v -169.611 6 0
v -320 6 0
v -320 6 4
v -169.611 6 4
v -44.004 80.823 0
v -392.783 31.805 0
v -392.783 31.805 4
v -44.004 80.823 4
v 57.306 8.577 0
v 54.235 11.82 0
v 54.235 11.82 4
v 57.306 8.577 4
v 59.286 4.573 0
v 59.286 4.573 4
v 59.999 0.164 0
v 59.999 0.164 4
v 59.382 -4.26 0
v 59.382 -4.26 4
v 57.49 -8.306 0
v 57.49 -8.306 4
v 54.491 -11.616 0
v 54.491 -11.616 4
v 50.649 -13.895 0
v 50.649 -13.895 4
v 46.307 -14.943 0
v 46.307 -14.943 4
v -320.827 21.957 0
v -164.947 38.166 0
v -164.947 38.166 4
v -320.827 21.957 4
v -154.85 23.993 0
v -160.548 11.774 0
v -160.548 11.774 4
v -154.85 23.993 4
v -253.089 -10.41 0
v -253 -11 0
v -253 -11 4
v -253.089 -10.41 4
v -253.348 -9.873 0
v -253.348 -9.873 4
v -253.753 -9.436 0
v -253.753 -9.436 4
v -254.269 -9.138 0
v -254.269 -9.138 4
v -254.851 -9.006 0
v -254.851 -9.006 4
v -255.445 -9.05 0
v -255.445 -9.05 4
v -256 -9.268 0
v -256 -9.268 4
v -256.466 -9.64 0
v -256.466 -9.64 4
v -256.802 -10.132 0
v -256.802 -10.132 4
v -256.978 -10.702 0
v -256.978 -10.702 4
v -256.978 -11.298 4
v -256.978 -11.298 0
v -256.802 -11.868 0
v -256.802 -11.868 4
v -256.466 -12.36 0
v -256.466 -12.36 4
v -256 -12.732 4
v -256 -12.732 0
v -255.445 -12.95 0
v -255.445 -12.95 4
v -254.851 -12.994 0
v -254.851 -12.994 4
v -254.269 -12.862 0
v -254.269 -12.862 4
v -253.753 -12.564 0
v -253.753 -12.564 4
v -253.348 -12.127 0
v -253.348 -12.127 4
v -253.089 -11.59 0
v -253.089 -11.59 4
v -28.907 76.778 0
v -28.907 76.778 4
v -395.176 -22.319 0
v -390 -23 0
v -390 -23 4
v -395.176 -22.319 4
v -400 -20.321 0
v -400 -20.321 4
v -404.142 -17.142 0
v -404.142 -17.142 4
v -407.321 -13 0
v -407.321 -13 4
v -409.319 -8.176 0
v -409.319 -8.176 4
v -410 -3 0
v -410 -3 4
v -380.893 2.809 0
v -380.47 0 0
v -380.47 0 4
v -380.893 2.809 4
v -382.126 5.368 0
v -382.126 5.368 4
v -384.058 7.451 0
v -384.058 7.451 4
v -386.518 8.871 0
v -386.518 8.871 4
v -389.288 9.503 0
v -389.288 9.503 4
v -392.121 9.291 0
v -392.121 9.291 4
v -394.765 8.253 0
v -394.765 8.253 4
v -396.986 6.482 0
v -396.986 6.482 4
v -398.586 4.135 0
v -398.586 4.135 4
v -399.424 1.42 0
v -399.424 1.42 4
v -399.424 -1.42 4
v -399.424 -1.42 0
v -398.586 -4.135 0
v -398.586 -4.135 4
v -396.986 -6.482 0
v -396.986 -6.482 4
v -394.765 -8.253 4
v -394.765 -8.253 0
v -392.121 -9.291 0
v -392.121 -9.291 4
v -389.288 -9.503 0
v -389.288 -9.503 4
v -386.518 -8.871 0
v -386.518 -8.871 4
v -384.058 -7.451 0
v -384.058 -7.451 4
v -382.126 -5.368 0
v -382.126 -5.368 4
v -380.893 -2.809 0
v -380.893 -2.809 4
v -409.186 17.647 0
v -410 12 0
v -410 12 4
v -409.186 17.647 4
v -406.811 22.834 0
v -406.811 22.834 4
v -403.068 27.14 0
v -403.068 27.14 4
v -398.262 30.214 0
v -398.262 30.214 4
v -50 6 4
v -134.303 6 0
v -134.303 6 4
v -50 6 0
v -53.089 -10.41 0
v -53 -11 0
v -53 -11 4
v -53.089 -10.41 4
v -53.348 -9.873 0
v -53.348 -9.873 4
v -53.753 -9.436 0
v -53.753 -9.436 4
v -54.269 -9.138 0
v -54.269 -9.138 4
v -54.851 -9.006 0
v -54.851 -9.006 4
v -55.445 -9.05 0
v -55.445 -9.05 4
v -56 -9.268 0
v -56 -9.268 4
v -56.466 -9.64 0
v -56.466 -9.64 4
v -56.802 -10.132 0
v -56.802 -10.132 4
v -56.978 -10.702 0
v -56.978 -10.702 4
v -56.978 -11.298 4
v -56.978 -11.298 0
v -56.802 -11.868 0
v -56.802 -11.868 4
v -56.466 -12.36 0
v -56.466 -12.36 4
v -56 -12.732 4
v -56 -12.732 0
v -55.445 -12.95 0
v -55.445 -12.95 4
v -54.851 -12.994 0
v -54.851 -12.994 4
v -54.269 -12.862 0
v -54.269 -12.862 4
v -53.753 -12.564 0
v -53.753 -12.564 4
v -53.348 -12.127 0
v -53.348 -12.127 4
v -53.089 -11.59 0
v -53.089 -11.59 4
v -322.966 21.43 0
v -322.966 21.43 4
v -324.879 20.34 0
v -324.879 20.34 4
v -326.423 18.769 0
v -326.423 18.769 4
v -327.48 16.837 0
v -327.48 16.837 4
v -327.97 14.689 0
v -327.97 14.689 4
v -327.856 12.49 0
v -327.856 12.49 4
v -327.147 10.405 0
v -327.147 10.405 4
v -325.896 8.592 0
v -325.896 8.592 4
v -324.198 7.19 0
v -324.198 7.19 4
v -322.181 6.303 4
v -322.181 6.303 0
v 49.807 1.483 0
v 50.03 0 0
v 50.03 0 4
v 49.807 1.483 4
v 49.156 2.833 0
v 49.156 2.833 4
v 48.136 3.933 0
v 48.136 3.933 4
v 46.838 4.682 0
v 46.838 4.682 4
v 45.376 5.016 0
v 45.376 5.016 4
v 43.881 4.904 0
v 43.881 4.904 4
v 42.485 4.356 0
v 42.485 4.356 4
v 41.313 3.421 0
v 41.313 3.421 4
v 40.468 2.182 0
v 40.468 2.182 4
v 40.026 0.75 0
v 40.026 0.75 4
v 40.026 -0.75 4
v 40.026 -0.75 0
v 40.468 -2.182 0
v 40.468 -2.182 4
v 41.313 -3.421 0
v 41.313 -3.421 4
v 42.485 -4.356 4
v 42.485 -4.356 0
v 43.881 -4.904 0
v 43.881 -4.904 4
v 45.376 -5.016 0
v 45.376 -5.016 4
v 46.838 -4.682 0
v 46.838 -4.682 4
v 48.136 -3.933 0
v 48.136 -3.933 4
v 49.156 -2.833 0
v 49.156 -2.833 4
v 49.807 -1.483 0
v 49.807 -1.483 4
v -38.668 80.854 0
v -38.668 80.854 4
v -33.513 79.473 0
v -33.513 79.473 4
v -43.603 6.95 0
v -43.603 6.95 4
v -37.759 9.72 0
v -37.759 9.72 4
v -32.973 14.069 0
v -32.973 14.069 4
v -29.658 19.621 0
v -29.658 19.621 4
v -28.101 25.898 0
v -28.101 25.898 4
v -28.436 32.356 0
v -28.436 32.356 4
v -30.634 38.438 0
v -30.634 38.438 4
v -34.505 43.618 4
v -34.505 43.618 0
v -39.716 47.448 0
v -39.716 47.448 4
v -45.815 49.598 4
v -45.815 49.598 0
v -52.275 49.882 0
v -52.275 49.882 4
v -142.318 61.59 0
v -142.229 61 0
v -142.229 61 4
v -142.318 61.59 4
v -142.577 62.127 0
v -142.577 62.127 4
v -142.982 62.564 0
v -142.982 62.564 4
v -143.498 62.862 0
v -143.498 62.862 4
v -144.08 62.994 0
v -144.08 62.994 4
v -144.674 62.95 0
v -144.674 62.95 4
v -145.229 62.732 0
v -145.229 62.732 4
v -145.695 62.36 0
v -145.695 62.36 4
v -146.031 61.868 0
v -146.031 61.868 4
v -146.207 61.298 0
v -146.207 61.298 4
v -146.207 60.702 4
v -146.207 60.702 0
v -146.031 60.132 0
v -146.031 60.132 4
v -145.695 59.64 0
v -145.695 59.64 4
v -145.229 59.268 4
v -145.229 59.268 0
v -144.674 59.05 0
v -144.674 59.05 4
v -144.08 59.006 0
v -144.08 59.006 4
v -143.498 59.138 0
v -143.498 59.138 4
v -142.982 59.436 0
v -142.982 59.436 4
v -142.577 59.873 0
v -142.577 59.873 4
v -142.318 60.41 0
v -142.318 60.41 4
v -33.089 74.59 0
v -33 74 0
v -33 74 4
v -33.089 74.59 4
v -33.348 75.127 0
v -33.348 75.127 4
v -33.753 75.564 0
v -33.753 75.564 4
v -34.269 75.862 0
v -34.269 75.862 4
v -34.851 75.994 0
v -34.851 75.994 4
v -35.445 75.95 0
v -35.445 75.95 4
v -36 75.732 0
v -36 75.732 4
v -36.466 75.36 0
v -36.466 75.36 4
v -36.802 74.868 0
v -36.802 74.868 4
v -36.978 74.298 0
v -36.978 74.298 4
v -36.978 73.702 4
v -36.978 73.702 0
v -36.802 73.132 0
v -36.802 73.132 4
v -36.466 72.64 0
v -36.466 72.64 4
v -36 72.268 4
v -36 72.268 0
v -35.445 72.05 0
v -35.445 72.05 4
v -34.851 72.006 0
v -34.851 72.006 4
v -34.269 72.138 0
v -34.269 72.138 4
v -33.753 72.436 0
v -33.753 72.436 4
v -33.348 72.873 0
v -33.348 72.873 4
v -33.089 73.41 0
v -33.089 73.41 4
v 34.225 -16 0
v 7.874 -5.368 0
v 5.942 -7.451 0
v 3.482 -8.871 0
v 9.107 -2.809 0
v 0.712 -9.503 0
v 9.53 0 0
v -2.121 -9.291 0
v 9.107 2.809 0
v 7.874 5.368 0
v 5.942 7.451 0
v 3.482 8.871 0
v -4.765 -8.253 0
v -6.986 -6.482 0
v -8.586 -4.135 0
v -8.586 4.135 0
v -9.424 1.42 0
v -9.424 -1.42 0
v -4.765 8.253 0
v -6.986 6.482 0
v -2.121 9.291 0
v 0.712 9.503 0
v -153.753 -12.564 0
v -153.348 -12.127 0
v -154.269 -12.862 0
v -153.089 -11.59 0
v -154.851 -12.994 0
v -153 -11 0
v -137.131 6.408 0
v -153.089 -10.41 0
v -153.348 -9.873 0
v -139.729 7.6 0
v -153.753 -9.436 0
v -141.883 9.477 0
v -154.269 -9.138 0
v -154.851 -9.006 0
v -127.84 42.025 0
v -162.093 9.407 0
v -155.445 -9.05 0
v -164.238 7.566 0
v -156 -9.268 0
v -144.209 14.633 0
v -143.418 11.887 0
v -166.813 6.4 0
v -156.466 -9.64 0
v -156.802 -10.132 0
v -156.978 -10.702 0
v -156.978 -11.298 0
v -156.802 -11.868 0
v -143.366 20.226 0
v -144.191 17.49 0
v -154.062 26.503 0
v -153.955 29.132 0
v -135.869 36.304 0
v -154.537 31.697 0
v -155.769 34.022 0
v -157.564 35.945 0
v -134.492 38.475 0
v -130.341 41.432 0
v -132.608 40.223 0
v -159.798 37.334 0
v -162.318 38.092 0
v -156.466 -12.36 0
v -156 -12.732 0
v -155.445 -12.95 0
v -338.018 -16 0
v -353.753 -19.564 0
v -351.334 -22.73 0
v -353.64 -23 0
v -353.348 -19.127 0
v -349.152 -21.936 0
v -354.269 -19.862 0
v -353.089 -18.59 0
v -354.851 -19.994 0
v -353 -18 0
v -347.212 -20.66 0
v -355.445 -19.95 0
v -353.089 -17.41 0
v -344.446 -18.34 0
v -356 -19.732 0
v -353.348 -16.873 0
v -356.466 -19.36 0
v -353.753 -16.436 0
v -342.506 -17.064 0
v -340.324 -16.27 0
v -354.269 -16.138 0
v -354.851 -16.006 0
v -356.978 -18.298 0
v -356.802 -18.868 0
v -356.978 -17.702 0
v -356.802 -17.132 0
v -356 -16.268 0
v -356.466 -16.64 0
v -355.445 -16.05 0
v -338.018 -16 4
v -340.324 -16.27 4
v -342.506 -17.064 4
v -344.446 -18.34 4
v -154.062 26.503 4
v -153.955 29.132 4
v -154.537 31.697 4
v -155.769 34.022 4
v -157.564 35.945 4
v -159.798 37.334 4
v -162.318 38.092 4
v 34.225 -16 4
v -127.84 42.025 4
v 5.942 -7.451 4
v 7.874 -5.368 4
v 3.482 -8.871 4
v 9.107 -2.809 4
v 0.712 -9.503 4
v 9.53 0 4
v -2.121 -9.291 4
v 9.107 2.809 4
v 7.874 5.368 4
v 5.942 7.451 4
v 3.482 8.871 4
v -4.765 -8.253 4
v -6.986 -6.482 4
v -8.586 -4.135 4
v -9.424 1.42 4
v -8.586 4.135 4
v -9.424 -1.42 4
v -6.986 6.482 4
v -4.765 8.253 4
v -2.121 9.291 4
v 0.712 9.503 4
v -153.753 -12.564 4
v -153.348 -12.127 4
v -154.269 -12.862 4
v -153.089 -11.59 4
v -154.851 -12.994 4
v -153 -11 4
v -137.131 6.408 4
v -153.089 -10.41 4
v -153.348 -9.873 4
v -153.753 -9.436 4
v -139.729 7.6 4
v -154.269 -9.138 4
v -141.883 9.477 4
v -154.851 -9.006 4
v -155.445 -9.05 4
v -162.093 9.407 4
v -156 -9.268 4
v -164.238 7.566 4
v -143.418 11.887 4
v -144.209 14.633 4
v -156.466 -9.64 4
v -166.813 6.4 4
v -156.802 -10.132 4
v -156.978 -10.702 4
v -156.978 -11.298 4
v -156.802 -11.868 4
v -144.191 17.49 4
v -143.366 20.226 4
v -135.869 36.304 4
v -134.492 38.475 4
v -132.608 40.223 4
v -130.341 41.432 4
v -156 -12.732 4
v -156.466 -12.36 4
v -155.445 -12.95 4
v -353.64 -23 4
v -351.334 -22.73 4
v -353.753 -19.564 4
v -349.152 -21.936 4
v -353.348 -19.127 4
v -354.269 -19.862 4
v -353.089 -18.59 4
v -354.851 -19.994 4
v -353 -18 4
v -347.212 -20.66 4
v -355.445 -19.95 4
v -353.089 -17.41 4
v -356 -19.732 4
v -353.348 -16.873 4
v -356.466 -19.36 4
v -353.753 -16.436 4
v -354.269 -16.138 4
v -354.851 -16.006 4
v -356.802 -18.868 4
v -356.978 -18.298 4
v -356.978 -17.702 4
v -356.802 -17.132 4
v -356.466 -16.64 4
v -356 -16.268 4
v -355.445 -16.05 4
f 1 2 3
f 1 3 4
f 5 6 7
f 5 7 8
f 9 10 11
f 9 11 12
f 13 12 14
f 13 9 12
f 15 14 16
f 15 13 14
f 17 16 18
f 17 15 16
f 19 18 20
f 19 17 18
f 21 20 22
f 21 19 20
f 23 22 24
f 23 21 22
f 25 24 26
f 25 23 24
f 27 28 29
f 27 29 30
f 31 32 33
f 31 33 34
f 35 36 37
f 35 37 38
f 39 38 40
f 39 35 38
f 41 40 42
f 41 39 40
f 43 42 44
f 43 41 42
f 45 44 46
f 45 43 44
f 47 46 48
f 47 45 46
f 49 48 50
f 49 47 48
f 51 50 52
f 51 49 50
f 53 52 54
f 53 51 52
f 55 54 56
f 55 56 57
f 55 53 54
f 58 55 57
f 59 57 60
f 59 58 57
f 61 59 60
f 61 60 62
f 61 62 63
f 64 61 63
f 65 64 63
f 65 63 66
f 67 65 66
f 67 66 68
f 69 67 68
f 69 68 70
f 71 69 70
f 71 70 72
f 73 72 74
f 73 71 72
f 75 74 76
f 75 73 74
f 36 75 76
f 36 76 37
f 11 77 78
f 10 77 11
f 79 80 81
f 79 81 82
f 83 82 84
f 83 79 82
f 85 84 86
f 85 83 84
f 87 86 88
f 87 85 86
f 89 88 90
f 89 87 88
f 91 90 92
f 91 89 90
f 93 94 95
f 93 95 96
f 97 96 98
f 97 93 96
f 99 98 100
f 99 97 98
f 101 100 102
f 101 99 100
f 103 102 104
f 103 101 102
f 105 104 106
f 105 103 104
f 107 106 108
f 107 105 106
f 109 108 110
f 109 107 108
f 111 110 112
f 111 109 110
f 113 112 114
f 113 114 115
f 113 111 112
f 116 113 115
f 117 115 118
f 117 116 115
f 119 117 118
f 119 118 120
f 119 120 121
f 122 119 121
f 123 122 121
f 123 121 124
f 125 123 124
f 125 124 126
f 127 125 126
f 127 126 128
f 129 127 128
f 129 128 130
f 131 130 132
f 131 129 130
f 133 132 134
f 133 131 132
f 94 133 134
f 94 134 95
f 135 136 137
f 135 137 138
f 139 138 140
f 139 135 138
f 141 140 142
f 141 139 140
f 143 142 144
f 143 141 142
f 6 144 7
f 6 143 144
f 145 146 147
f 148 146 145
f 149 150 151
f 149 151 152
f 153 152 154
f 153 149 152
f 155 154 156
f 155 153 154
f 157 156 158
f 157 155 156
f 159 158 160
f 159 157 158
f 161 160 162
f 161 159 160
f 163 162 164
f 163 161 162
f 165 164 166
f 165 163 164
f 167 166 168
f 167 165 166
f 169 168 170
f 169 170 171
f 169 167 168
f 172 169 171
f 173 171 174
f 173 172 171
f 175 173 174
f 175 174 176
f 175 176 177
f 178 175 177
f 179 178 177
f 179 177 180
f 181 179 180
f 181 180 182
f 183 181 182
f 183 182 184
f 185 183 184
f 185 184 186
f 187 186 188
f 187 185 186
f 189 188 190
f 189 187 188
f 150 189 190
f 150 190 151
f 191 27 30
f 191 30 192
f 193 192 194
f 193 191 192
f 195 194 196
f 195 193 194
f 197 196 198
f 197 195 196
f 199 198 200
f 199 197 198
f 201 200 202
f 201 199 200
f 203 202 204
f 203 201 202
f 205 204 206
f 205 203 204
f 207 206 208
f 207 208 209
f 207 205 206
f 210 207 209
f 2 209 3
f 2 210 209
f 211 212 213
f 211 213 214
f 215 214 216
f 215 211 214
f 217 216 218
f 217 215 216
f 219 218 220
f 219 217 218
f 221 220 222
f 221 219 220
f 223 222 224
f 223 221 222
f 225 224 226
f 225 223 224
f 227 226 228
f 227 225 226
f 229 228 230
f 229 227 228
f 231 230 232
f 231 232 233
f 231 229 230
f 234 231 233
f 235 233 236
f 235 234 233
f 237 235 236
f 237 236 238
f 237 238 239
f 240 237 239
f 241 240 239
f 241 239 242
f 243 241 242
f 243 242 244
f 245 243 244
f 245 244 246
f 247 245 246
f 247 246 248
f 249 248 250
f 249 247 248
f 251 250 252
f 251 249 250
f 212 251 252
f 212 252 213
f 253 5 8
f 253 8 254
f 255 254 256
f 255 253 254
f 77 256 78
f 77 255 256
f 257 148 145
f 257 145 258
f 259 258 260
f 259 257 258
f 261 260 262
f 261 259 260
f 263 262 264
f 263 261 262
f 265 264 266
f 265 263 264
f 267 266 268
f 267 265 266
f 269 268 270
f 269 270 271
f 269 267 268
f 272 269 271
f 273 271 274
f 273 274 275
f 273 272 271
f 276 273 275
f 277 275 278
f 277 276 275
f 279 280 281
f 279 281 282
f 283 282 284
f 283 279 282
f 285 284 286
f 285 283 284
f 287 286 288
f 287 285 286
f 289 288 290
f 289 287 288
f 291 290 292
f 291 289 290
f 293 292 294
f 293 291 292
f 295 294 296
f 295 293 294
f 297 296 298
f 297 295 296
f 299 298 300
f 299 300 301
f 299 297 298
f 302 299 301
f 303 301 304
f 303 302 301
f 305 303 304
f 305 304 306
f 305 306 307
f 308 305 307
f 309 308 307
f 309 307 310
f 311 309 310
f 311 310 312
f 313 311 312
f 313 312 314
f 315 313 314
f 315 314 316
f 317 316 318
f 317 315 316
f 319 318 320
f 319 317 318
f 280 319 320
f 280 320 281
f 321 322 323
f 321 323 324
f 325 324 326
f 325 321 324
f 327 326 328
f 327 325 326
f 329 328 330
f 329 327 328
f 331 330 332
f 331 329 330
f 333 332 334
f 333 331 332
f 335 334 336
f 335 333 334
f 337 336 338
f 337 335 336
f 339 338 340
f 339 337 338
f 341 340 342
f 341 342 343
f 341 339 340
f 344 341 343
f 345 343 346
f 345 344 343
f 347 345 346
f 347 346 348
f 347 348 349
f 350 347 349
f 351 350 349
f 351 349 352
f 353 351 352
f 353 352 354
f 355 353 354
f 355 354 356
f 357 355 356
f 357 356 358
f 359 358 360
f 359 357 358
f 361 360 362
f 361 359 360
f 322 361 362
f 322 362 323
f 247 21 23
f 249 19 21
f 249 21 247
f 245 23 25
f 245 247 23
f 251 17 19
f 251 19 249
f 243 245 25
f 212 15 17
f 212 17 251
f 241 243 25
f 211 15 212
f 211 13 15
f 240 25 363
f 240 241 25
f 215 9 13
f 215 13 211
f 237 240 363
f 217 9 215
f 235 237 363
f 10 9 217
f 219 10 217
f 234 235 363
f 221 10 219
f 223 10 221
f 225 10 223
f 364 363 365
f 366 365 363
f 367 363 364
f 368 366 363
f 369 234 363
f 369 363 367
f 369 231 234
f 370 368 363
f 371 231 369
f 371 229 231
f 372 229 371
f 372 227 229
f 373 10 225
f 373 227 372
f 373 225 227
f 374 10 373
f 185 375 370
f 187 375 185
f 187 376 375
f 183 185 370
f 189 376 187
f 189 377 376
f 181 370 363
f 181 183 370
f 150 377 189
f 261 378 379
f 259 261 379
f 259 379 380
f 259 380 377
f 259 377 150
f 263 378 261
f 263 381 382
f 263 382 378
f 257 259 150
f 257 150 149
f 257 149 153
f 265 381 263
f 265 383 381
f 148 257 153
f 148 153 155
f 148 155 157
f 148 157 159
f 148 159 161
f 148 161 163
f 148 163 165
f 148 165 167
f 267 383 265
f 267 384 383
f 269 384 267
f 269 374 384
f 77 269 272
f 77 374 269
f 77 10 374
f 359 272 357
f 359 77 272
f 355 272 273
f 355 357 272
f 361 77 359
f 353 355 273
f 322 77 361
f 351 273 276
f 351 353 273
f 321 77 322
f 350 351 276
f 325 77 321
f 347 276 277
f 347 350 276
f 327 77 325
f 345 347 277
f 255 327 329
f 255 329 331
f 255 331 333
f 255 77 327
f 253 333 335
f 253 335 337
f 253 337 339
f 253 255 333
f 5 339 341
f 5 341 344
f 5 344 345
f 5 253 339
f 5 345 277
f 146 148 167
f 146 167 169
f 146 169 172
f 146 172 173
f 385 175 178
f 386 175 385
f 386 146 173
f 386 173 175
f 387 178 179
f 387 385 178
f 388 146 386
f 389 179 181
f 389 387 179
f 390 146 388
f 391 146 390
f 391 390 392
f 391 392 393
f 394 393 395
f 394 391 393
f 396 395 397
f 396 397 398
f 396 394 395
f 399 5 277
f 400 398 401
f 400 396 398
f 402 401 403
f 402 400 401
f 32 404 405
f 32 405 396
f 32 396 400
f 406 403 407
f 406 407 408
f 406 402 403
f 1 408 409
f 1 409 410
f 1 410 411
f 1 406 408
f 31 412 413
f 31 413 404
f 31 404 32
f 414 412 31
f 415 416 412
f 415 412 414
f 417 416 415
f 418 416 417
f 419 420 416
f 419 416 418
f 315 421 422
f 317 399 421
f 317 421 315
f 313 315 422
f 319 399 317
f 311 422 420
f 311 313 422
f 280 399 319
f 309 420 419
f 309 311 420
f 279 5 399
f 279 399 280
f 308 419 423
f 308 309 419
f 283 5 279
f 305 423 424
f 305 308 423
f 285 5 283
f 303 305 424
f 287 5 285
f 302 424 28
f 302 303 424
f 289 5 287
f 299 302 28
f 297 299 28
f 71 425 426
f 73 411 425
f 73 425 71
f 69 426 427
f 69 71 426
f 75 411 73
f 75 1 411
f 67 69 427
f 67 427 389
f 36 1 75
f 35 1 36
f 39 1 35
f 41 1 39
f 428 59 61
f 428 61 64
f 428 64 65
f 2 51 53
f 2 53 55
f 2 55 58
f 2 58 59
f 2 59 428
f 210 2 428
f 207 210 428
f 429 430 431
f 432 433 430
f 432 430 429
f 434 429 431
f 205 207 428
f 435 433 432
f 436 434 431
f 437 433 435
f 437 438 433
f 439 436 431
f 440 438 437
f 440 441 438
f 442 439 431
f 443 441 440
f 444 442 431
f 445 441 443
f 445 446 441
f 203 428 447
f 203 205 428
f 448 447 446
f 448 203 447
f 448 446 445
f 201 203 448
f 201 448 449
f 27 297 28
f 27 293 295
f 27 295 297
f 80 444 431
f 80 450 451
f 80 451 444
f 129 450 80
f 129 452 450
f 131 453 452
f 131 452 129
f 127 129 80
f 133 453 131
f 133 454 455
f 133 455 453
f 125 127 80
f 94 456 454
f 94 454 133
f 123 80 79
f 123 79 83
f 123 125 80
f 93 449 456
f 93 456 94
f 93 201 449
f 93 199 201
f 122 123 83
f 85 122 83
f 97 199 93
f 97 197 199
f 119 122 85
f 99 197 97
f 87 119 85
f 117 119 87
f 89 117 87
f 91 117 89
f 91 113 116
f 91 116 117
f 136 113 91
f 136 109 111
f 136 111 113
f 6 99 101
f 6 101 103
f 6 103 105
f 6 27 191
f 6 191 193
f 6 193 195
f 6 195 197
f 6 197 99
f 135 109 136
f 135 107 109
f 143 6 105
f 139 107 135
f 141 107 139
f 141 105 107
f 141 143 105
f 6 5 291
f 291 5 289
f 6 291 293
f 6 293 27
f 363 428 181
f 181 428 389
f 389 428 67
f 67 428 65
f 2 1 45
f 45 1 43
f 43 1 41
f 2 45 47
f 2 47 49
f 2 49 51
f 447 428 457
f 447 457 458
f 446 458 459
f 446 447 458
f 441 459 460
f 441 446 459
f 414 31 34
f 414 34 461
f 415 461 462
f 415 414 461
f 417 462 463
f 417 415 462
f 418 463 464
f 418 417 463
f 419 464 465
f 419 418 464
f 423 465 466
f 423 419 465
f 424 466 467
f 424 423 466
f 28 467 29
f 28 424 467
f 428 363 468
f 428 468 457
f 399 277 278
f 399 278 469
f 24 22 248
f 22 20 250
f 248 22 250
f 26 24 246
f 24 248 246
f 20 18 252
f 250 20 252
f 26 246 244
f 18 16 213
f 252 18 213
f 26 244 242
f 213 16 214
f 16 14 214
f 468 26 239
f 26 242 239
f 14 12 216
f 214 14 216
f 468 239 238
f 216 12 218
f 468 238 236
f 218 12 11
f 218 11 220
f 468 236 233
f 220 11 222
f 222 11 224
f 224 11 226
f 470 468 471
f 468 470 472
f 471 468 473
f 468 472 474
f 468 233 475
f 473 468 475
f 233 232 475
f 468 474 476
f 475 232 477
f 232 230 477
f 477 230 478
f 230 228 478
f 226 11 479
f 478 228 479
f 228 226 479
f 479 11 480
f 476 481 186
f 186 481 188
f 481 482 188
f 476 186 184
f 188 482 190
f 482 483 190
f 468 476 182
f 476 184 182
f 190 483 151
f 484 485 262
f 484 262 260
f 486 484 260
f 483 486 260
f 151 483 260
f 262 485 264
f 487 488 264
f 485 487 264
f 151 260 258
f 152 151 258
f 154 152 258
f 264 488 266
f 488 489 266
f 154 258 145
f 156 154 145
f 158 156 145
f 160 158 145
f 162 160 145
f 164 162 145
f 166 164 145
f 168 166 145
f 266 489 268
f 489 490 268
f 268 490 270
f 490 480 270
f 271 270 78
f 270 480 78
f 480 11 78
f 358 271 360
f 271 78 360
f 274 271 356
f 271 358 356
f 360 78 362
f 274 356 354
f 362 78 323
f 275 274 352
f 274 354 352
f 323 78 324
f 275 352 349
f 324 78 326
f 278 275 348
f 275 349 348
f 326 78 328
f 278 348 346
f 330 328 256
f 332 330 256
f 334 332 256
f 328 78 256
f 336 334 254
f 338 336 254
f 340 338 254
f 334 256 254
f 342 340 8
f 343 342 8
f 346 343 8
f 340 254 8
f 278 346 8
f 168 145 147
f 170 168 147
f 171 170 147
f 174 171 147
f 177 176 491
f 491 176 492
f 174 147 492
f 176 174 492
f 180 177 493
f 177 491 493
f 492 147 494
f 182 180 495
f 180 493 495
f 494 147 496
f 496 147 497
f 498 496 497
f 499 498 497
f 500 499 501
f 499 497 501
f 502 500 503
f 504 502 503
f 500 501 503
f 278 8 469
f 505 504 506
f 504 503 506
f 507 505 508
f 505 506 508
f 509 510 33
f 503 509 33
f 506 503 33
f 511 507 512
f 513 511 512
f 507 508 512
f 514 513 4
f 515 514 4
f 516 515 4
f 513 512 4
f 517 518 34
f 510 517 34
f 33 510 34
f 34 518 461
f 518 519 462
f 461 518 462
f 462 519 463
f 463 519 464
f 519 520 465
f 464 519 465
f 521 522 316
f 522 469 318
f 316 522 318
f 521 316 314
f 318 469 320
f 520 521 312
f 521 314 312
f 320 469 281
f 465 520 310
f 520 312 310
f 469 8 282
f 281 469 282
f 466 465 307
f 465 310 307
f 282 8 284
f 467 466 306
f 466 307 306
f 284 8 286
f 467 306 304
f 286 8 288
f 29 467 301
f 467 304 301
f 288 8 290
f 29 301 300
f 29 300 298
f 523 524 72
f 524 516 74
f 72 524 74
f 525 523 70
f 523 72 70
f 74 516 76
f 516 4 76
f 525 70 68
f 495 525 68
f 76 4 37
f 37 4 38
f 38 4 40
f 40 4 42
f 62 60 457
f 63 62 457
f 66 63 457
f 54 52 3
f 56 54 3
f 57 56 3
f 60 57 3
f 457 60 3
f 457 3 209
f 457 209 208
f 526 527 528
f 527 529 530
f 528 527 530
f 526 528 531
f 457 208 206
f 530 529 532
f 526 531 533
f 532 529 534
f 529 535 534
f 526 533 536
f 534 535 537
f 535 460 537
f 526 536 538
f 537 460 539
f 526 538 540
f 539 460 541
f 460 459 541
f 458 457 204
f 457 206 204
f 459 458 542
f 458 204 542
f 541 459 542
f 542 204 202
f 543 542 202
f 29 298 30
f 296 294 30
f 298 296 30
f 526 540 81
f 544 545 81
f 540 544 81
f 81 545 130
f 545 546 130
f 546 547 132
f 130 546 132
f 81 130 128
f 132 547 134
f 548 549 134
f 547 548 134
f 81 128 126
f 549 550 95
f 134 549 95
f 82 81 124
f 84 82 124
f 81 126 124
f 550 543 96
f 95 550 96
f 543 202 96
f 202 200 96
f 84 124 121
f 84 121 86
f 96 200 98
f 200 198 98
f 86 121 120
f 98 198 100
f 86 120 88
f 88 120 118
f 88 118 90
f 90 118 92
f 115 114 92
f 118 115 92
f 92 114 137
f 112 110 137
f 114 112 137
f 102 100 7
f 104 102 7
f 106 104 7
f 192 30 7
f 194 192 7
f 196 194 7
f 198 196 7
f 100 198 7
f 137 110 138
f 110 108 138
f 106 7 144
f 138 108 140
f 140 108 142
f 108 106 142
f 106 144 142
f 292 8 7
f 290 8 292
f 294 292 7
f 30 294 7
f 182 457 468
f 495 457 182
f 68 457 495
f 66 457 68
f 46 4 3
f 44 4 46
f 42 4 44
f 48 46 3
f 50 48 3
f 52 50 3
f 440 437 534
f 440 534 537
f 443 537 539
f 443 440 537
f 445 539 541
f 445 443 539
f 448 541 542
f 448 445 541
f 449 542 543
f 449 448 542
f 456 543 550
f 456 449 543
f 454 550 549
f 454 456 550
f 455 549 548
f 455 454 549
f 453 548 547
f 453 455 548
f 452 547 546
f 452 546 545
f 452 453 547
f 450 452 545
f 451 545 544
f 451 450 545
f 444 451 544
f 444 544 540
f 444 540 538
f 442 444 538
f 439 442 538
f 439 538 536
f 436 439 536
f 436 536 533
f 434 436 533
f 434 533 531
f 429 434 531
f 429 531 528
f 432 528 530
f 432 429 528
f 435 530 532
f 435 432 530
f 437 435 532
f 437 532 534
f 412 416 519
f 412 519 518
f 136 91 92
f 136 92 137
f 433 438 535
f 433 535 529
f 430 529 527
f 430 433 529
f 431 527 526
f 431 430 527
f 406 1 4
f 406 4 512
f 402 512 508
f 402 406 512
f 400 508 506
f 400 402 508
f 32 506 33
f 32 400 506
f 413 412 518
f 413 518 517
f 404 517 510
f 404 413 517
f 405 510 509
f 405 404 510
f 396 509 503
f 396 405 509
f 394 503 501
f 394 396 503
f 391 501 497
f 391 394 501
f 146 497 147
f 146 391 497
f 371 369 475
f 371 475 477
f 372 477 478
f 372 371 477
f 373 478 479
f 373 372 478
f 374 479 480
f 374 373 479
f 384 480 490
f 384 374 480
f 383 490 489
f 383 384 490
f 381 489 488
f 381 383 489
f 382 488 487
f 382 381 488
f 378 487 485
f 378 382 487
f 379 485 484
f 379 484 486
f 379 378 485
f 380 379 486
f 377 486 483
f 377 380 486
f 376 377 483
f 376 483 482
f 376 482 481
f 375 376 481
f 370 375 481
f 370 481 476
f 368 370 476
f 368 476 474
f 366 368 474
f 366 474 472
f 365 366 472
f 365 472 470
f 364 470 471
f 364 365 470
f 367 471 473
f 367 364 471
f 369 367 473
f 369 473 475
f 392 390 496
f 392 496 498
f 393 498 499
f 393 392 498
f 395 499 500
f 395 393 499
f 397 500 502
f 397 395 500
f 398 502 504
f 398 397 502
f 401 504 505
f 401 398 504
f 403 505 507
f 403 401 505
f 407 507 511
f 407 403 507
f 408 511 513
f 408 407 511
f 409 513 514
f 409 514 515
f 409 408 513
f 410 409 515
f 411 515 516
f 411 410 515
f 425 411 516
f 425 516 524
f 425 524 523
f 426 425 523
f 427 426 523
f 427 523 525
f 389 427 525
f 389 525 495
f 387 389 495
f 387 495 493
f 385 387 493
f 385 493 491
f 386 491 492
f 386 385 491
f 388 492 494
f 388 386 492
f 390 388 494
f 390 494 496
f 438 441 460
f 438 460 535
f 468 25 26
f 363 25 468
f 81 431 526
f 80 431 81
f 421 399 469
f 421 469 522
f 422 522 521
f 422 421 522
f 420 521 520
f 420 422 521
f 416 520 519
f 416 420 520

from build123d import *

# Parameters (mm, degrees)
SKETCH_1_R      = 5.03
SKETCH_1_R_2    = 2
SKETCH_1_R_3    = 9.53
EXTRUDE_1_DEPTH = 4


with BuildPart() as part:
    # 草图1 → 凸台-拉伸1 (new body)
    with BuildSketch(Plane.XY):
        with BuildLine():
            Line((-392.783462019, 31.805361375), (-44.003979129, 80.823121027))
            ThreePointArc((-44.003979129, 80.823121027), (-36.044136208, 80.336276178), (-28.907287603, 76.777974725))
            Line((-28.907287603, 76.777974725), (54.23492213, 11.820161304))
            ThreePointArc((54.23492213, 11.820161304), (59.382296023, -4.260230171), (46.307336141, -14.942920471))
            Line((46.307336141, -14.942920471), (34.224861841, -16))
            Line((34.224861841, -16), (-338.018022509, -16))
            ThreePointArc((-338.018022509, -16), (-341.438223942, -16.603073792), (-344.445898606, -18.339555569))
            Line((-344.445898606, -18.339555569), (-347.211826246, -20.660444431))
            ThreePointArc((-347.211826246, -20.660444431), (-350.219500909, -22.396926208), (-353.639702343, -23))
            Line((-353.639702343, -23), (-390, -23))
            ThreePointArc((-390, -23), (-404.142135624, -17.142135624), (-410, -3))
            Line((-410, -3), (-410, 12))
            ThreePointArc((-410, 12), (-405.094191604, 25.12118058), (-392.783462019, 31.805361375))
        make_face()
        with Locations((45, 0)):
            Circle(SKETCH_1_R, mode=Mode.SUBTRACT)
        with Locations((-55, -11)):
            Circle(SKETCH_1_R_2, mode=Mode.SUBTRACT)
        with Locations((-144.229116997, 61)):
            Circle(SKETCH_1_R_2, mode=Mode.SUBTRACT)
        Circle(SKETCH_1_R_3, mode=Mode.SUBTRACT)
        with Locations((-255, -11)):
            Circle(SKETCH_1_R_2, mode=Mode.SUBTRACT)
        with Locations((-390, 0)):
            Circle(SKETCH_1_R_3, mode=Mode.SUBTRACT)
        with Locations((-35, 74)):
            Circle(SKETCH_1_R_2, mode=Mode.SUBTRACT)
        with Locations((-355, -18)):
            Circle(SKETCH_1_R_2, mode=Mode.SUBTRACT)
        with Locations((-155, -11)):
            Circle(SKETCH_1_R_2, mode=Mode.SUBTRACT)
        with BuildLine():
            Line((-134.303144229, 6), (-50, 6))
            ThreePointArc((-50, 6), (-28.029515257, 29.13921032), (-52.275363905, 49.882018168))
            Line((-52.275363905, 49.882018168), (-127.840019308, 42.024557851))
            ThreePointArc((-127.840019308, 42.024557851), (-132.608278027, 40.222559427), (-135.868840858, 36.304368574))
            Line((-135.868840858, 36.304368574), (-143.366222099, 20.226182617))
            ThreePointArc((-143.366222099, 20.226182617), (-142.737058687, 10.627003917), (-134.303144229, 6))
        make_face(mode=Mode.SUBTRACT)
        with BuildLine():
            Line((-320, 6), (-169.611237636, 6))
            ThreePointArc((-169.611237636, 6), (-164.238241552, 7.566085542), (-160.548159765, 11.773817383))
            Line((-160.548159765, 11.773817383), (-154.850047639, 23.993458271))
            ThreePointArc((-154.850047639, 23.993458271), (-155.76875204, 34.022155928), (-164.94738183, 38.166012783))
            Line((-164.94738183, 38.166012783), (-320.827405056, 21.957097516))
            ThreePointArc((-320.827405056, 21.957097516), (-327.989267179, 13.585741702), (-320, 6))
        make_face(mode=Mode.SUBTRACT)
    extrude(amount=EXTRUDE_1_DEPTH)


solid = part.part
